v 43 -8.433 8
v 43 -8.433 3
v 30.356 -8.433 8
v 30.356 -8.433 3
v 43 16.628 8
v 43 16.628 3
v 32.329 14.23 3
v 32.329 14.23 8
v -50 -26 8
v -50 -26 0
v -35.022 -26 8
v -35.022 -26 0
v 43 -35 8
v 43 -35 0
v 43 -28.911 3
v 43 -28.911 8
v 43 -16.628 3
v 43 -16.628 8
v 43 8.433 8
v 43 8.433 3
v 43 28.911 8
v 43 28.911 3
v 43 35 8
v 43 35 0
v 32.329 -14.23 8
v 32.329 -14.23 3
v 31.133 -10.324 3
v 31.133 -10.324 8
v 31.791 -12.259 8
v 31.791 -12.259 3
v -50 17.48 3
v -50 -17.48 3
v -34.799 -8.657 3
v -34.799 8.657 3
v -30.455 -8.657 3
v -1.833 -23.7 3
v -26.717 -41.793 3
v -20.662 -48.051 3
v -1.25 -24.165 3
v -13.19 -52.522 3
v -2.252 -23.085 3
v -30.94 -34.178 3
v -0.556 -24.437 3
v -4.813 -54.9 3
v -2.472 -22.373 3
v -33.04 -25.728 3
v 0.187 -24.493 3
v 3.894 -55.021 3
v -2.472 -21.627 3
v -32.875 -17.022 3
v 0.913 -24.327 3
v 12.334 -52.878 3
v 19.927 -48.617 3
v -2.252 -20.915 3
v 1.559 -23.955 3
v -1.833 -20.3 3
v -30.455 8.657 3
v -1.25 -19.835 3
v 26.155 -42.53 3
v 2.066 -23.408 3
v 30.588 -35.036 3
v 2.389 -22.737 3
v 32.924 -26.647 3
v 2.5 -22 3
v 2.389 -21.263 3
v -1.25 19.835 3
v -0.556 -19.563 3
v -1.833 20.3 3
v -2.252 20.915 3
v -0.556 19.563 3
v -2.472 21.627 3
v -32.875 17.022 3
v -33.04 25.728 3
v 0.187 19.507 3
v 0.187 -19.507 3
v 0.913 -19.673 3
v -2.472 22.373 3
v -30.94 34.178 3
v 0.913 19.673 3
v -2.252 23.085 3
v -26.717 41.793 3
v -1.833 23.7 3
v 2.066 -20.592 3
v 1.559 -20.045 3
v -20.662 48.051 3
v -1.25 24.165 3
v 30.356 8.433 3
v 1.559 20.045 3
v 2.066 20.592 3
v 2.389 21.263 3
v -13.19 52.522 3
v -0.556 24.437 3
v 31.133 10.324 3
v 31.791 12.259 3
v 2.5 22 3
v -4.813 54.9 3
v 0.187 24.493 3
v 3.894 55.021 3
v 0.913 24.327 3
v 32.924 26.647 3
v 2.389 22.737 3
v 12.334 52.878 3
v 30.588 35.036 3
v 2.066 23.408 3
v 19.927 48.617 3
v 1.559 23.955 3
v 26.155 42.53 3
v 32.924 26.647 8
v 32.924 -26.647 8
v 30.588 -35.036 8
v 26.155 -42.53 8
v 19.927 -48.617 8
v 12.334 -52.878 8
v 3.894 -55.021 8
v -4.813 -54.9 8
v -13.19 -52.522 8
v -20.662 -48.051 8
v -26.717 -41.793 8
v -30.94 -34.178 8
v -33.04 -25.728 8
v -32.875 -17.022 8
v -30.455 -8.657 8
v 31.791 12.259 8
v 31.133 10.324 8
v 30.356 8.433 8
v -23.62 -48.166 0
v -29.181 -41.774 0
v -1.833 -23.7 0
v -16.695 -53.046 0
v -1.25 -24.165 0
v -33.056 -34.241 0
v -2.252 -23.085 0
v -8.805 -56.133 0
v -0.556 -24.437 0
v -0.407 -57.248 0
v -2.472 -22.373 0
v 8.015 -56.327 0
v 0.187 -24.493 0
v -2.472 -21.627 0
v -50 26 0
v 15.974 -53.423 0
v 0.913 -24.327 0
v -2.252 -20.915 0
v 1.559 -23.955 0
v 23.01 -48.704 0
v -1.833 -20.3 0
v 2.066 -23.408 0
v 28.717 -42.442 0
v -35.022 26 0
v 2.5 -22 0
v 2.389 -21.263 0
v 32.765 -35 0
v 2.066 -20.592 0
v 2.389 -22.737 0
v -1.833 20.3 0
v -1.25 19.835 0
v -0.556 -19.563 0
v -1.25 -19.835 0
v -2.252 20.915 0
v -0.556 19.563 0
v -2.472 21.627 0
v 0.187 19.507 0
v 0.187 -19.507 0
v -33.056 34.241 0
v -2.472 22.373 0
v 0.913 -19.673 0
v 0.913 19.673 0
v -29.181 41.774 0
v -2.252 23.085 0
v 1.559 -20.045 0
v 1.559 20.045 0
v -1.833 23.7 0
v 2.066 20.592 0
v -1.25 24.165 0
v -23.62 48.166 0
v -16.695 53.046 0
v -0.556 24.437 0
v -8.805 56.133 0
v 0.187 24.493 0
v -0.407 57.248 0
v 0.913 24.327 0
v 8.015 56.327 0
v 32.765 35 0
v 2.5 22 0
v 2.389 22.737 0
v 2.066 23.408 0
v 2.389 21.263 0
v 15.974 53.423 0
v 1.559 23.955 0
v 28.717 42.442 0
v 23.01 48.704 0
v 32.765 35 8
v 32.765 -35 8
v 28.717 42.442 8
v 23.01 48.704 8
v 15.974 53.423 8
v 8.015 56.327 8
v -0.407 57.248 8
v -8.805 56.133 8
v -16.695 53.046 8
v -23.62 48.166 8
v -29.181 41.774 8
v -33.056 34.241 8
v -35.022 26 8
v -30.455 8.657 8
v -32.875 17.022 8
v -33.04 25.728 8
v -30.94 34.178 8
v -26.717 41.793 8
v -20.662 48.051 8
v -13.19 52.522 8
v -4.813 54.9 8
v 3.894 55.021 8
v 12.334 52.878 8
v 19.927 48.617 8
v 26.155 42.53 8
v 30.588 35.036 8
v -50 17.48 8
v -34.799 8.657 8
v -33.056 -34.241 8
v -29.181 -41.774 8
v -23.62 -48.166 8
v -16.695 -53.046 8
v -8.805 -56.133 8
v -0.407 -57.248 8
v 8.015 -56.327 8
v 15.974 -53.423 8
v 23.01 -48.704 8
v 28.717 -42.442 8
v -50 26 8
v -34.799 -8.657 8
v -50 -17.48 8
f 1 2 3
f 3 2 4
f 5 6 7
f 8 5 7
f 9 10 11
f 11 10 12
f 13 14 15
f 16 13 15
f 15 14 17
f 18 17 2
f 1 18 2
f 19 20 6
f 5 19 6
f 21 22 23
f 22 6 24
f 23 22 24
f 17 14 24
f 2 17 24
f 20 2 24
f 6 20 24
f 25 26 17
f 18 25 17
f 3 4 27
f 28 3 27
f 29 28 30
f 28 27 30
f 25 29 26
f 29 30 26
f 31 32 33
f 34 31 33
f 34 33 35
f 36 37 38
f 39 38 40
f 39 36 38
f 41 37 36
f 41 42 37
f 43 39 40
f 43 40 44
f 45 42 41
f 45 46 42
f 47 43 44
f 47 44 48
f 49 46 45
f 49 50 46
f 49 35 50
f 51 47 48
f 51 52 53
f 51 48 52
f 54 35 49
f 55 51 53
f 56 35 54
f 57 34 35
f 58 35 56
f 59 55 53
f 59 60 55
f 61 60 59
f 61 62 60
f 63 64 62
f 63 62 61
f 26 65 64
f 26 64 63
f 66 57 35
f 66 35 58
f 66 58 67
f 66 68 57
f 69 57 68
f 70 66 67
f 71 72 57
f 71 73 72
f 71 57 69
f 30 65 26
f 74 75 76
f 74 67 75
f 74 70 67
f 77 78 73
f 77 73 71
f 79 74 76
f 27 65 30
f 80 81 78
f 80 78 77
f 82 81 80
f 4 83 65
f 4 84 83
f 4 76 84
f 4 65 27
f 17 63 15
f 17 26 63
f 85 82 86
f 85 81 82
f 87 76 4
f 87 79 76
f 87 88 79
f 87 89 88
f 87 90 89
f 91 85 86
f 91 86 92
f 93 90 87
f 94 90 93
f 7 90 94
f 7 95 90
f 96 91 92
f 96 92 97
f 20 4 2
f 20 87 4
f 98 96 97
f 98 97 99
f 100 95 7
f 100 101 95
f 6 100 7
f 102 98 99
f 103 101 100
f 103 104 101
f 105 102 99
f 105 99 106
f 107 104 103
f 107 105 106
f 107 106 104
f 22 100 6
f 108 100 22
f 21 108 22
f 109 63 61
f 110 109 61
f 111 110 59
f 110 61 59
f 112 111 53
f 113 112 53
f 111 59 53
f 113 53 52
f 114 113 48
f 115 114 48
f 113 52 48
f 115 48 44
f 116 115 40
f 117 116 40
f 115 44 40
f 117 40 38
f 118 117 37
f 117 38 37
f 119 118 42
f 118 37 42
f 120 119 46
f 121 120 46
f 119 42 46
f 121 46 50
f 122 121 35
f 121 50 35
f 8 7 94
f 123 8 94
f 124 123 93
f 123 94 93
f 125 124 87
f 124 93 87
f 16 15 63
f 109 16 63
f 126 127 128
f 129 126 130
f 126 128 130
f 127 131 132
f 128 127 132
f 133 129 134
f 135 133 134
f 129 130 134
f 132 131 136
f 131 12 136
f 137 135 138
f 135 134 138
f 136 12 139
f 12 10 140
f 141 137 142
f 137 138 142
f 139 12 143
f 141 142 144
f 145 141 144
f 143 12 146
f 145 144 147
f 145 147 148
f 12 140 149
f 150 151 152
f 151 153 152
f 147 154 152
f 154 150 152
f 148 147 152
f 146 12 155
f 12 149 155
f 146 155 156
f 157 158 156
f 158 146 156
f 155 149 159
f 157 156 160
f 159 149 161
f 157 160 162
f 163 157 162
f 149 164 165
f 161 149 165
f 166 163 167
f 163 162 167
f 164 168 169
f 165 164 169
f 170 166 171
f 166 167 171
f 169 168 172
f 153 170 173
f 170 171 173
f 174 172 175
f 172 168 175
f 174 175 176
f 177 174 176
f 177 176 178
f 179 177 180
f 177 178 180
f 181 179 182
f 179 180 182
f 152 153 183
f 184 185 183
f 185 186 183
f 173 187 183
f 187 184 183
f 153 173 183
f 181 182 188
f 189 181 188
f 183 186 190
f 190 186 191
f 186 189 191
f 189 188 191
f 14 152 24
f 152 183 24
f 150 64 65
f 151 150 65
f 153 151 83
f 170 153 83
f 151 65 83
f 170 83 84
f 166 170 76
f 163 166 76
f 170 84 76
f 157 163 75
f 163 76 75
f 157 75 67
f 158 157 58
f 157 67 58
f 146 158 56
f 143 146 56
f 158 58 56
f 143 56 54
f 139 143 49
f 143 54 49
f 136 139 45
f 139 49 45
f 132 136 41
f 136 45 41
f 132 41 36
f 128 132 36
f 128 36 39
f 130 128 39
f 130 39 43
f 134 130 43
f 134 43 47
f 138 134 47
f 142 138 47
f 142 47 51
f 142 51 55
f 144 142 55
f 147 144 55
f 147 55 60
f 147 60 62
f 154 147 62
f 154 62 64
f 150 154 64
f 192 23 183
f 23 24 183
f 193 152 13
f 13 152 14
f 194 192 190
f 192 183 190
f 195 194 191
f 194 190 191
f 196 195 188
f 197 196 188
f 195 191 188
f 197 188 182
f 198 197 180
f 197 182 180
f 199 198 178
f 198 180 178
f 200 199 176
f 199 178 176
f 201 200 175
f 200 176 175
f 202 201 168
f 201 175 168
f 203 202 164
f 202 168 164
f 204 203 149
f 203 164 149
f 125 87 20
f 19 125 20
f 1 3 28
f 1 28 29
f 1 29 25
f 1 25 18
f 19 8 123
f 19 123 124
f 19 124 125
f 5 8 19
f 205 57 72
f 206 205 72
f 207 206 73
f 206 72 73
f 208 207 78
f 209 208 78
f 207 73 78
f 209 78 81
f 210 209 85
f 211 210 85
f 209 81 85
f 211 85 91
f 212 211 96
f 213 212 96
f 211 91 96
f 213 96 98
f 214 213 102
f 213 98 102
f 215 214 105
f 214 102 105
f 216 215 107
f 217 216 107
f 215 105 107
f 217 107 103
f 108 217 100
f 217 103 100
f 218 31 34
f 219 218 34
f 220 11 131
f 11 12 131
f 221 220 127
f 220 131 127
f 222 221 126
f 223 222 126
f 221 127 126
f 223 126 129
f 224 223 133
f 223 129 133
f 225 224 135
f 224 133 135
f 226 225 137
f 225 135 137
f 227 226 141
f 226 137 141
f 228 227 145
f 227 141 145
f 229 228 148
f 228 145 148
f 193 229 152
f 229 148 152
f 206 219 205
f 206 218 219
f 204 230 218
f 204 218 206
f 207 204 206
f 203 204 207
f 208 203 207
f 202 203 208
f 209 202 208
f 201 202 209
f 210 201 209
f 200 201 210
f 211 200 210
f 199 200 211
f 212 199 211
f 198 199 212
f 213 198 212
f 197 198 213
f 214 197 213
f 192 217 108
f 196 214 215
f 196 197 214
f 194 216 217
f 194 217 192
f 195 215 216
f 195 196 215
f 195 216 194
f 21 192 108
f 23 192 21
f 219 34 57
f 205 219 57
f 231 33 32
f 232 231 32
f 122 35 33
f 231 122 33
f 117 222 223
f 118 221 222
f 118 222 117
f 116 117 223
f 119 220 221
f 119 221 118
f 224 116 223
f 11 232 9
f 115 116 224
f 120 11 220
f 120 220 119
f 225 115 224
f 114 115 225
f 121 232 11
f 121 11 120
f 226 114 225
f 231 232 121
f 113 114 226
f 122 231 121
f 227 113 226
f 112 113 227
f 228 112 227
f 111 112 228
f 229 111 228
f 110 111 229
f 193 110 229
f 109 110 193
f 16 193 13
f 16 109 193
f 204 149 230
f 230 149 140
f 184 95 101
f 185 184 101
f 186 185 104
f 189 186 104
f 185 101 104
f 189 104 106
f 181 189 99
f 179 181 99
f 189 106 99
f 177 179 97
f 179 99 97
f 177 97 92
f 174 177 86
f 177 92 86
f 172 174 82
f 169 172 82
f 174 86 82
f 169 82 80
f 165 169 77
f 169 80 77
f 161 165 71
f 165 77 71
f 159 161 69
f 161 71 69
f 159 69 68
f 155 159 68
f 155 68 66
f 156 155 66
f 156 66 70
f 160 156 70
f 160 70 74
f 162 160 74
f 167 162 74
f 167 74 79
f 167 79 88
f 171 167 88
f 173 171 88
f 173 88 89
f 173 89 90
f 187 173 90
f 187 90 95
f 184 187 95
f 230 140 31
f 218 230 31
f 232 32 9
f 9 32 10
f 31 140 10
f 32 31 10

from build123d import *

# Parameters (mm, degrees)
F1_DEPTH = 3
F3_DEPTH = 5
F4_R     = 2.5
F5_DEPTH = 3.001


with BuildPart() as f1:
    # F0 (on Top) → F1 (new body)
    with BuildSketch(Plane.XY):
        with BuildLine():
            Line((43, -35), (43, 35))
            Line((43, 35), (32.765264, 35))
            ThreePointArc((32.765264, 35), (-4.63935, 56.943367), (-35.022314, 26))
            Line((-35.022314, 26), (-50, 26))
            Line((-50, 26), (-50, -26))
            Line((-50, -26), (-35.022314, -26))
            ThreePointArc((-35.022314, -26), (-4.63935, -56.943367), (32.765264, -35))
            Line((32.765264, -35), (43, -35))
        make_face()
    extrude(amount=F1_DEPTH)

    # F2 (on face) → F3 (join)
    with BuildSketch(Plane.XY.offset(3)):
        with BuildLine():
            Line((-34.799137, 8.656902), (-30.455283, 8.656902))
            ThreePointArc((-30.455283, 8.656902), (-9.079543, 53.986316), (32.923604, 26.647449))
            Line((32.923604, 26.647449), (43, 28.911306))
            Line((43, 28.911306), (43, 35))
            Line((43, 35), (32.765264, 35))
            ThreePointArc((32.765264, 35), (-4.63935, 56.943367), (-35.022314, 26))
            Line((-35.022314, 26), (-50, 26))
            Line((-50, 26), (-50, 17.479896))
            Line((-50, 17.479896), (-34.799137, 8.656902))
        make_face()
        with BuildLine():
            Line((43, -28.911306), (32.923604, -26.647449))
            ThreePointArc((32.923604, -26.647449), (-9.079543, -53.986316), (-30.455283, -8.656902))
            Line((-30.455283, -8.656902), (-34.799137, -8.656902))
            Line((-34.799137, -8.656902), (-50, -17.479896))
            Line((-50, -17.479896), (-50, -26))
            Line((-50, -26), (-35.022314, -26))
            ThreePointArc((-35.022314, -26), (-4.63935, -56.943367), (32.765264, -35))
            Line((32.765264, -35), (43, -35))
            Line((43, -35), (43, -28.911306))
        make_face()
        with BuildLine():
            Line((43, 16.62755), (32.329441, 14.230203))
            ThreePointArc((32.329441, 14.230203), (31.476652, 11.286323), (30.356414, 8.433473))
            Line((30.356414, 8.433473), (43, 8.433473))
            Line((43, 8.433473), (43, 16.62755))
        make_face()
        with BuildLine():
            Line((43, -8.433473), (30.356414, -8.433473))
            ThreePointArc((30.356414, -8.433473), (31.476652, -11.286323), (32.329441, -14.230203))
            Line((32.329441, -14.230203), (43, -16.62755))
            Line((43, -16.62755), (43, -8.433473))
        make_face()
    extrude(amount=F3_DEPTH)

    # F4 (on face) → F5 (cut, through all)
    with BuildSketch(Plane.XY.offset(3)):
        with Locations((0, 22)):
            Circle(F4_R)
        with Locations((0, -22)):
            Circle(F4_R)
    extrude(amount=-F5_DEPTH, mode=Mode.SUBTRACT)


solid = f1.part
